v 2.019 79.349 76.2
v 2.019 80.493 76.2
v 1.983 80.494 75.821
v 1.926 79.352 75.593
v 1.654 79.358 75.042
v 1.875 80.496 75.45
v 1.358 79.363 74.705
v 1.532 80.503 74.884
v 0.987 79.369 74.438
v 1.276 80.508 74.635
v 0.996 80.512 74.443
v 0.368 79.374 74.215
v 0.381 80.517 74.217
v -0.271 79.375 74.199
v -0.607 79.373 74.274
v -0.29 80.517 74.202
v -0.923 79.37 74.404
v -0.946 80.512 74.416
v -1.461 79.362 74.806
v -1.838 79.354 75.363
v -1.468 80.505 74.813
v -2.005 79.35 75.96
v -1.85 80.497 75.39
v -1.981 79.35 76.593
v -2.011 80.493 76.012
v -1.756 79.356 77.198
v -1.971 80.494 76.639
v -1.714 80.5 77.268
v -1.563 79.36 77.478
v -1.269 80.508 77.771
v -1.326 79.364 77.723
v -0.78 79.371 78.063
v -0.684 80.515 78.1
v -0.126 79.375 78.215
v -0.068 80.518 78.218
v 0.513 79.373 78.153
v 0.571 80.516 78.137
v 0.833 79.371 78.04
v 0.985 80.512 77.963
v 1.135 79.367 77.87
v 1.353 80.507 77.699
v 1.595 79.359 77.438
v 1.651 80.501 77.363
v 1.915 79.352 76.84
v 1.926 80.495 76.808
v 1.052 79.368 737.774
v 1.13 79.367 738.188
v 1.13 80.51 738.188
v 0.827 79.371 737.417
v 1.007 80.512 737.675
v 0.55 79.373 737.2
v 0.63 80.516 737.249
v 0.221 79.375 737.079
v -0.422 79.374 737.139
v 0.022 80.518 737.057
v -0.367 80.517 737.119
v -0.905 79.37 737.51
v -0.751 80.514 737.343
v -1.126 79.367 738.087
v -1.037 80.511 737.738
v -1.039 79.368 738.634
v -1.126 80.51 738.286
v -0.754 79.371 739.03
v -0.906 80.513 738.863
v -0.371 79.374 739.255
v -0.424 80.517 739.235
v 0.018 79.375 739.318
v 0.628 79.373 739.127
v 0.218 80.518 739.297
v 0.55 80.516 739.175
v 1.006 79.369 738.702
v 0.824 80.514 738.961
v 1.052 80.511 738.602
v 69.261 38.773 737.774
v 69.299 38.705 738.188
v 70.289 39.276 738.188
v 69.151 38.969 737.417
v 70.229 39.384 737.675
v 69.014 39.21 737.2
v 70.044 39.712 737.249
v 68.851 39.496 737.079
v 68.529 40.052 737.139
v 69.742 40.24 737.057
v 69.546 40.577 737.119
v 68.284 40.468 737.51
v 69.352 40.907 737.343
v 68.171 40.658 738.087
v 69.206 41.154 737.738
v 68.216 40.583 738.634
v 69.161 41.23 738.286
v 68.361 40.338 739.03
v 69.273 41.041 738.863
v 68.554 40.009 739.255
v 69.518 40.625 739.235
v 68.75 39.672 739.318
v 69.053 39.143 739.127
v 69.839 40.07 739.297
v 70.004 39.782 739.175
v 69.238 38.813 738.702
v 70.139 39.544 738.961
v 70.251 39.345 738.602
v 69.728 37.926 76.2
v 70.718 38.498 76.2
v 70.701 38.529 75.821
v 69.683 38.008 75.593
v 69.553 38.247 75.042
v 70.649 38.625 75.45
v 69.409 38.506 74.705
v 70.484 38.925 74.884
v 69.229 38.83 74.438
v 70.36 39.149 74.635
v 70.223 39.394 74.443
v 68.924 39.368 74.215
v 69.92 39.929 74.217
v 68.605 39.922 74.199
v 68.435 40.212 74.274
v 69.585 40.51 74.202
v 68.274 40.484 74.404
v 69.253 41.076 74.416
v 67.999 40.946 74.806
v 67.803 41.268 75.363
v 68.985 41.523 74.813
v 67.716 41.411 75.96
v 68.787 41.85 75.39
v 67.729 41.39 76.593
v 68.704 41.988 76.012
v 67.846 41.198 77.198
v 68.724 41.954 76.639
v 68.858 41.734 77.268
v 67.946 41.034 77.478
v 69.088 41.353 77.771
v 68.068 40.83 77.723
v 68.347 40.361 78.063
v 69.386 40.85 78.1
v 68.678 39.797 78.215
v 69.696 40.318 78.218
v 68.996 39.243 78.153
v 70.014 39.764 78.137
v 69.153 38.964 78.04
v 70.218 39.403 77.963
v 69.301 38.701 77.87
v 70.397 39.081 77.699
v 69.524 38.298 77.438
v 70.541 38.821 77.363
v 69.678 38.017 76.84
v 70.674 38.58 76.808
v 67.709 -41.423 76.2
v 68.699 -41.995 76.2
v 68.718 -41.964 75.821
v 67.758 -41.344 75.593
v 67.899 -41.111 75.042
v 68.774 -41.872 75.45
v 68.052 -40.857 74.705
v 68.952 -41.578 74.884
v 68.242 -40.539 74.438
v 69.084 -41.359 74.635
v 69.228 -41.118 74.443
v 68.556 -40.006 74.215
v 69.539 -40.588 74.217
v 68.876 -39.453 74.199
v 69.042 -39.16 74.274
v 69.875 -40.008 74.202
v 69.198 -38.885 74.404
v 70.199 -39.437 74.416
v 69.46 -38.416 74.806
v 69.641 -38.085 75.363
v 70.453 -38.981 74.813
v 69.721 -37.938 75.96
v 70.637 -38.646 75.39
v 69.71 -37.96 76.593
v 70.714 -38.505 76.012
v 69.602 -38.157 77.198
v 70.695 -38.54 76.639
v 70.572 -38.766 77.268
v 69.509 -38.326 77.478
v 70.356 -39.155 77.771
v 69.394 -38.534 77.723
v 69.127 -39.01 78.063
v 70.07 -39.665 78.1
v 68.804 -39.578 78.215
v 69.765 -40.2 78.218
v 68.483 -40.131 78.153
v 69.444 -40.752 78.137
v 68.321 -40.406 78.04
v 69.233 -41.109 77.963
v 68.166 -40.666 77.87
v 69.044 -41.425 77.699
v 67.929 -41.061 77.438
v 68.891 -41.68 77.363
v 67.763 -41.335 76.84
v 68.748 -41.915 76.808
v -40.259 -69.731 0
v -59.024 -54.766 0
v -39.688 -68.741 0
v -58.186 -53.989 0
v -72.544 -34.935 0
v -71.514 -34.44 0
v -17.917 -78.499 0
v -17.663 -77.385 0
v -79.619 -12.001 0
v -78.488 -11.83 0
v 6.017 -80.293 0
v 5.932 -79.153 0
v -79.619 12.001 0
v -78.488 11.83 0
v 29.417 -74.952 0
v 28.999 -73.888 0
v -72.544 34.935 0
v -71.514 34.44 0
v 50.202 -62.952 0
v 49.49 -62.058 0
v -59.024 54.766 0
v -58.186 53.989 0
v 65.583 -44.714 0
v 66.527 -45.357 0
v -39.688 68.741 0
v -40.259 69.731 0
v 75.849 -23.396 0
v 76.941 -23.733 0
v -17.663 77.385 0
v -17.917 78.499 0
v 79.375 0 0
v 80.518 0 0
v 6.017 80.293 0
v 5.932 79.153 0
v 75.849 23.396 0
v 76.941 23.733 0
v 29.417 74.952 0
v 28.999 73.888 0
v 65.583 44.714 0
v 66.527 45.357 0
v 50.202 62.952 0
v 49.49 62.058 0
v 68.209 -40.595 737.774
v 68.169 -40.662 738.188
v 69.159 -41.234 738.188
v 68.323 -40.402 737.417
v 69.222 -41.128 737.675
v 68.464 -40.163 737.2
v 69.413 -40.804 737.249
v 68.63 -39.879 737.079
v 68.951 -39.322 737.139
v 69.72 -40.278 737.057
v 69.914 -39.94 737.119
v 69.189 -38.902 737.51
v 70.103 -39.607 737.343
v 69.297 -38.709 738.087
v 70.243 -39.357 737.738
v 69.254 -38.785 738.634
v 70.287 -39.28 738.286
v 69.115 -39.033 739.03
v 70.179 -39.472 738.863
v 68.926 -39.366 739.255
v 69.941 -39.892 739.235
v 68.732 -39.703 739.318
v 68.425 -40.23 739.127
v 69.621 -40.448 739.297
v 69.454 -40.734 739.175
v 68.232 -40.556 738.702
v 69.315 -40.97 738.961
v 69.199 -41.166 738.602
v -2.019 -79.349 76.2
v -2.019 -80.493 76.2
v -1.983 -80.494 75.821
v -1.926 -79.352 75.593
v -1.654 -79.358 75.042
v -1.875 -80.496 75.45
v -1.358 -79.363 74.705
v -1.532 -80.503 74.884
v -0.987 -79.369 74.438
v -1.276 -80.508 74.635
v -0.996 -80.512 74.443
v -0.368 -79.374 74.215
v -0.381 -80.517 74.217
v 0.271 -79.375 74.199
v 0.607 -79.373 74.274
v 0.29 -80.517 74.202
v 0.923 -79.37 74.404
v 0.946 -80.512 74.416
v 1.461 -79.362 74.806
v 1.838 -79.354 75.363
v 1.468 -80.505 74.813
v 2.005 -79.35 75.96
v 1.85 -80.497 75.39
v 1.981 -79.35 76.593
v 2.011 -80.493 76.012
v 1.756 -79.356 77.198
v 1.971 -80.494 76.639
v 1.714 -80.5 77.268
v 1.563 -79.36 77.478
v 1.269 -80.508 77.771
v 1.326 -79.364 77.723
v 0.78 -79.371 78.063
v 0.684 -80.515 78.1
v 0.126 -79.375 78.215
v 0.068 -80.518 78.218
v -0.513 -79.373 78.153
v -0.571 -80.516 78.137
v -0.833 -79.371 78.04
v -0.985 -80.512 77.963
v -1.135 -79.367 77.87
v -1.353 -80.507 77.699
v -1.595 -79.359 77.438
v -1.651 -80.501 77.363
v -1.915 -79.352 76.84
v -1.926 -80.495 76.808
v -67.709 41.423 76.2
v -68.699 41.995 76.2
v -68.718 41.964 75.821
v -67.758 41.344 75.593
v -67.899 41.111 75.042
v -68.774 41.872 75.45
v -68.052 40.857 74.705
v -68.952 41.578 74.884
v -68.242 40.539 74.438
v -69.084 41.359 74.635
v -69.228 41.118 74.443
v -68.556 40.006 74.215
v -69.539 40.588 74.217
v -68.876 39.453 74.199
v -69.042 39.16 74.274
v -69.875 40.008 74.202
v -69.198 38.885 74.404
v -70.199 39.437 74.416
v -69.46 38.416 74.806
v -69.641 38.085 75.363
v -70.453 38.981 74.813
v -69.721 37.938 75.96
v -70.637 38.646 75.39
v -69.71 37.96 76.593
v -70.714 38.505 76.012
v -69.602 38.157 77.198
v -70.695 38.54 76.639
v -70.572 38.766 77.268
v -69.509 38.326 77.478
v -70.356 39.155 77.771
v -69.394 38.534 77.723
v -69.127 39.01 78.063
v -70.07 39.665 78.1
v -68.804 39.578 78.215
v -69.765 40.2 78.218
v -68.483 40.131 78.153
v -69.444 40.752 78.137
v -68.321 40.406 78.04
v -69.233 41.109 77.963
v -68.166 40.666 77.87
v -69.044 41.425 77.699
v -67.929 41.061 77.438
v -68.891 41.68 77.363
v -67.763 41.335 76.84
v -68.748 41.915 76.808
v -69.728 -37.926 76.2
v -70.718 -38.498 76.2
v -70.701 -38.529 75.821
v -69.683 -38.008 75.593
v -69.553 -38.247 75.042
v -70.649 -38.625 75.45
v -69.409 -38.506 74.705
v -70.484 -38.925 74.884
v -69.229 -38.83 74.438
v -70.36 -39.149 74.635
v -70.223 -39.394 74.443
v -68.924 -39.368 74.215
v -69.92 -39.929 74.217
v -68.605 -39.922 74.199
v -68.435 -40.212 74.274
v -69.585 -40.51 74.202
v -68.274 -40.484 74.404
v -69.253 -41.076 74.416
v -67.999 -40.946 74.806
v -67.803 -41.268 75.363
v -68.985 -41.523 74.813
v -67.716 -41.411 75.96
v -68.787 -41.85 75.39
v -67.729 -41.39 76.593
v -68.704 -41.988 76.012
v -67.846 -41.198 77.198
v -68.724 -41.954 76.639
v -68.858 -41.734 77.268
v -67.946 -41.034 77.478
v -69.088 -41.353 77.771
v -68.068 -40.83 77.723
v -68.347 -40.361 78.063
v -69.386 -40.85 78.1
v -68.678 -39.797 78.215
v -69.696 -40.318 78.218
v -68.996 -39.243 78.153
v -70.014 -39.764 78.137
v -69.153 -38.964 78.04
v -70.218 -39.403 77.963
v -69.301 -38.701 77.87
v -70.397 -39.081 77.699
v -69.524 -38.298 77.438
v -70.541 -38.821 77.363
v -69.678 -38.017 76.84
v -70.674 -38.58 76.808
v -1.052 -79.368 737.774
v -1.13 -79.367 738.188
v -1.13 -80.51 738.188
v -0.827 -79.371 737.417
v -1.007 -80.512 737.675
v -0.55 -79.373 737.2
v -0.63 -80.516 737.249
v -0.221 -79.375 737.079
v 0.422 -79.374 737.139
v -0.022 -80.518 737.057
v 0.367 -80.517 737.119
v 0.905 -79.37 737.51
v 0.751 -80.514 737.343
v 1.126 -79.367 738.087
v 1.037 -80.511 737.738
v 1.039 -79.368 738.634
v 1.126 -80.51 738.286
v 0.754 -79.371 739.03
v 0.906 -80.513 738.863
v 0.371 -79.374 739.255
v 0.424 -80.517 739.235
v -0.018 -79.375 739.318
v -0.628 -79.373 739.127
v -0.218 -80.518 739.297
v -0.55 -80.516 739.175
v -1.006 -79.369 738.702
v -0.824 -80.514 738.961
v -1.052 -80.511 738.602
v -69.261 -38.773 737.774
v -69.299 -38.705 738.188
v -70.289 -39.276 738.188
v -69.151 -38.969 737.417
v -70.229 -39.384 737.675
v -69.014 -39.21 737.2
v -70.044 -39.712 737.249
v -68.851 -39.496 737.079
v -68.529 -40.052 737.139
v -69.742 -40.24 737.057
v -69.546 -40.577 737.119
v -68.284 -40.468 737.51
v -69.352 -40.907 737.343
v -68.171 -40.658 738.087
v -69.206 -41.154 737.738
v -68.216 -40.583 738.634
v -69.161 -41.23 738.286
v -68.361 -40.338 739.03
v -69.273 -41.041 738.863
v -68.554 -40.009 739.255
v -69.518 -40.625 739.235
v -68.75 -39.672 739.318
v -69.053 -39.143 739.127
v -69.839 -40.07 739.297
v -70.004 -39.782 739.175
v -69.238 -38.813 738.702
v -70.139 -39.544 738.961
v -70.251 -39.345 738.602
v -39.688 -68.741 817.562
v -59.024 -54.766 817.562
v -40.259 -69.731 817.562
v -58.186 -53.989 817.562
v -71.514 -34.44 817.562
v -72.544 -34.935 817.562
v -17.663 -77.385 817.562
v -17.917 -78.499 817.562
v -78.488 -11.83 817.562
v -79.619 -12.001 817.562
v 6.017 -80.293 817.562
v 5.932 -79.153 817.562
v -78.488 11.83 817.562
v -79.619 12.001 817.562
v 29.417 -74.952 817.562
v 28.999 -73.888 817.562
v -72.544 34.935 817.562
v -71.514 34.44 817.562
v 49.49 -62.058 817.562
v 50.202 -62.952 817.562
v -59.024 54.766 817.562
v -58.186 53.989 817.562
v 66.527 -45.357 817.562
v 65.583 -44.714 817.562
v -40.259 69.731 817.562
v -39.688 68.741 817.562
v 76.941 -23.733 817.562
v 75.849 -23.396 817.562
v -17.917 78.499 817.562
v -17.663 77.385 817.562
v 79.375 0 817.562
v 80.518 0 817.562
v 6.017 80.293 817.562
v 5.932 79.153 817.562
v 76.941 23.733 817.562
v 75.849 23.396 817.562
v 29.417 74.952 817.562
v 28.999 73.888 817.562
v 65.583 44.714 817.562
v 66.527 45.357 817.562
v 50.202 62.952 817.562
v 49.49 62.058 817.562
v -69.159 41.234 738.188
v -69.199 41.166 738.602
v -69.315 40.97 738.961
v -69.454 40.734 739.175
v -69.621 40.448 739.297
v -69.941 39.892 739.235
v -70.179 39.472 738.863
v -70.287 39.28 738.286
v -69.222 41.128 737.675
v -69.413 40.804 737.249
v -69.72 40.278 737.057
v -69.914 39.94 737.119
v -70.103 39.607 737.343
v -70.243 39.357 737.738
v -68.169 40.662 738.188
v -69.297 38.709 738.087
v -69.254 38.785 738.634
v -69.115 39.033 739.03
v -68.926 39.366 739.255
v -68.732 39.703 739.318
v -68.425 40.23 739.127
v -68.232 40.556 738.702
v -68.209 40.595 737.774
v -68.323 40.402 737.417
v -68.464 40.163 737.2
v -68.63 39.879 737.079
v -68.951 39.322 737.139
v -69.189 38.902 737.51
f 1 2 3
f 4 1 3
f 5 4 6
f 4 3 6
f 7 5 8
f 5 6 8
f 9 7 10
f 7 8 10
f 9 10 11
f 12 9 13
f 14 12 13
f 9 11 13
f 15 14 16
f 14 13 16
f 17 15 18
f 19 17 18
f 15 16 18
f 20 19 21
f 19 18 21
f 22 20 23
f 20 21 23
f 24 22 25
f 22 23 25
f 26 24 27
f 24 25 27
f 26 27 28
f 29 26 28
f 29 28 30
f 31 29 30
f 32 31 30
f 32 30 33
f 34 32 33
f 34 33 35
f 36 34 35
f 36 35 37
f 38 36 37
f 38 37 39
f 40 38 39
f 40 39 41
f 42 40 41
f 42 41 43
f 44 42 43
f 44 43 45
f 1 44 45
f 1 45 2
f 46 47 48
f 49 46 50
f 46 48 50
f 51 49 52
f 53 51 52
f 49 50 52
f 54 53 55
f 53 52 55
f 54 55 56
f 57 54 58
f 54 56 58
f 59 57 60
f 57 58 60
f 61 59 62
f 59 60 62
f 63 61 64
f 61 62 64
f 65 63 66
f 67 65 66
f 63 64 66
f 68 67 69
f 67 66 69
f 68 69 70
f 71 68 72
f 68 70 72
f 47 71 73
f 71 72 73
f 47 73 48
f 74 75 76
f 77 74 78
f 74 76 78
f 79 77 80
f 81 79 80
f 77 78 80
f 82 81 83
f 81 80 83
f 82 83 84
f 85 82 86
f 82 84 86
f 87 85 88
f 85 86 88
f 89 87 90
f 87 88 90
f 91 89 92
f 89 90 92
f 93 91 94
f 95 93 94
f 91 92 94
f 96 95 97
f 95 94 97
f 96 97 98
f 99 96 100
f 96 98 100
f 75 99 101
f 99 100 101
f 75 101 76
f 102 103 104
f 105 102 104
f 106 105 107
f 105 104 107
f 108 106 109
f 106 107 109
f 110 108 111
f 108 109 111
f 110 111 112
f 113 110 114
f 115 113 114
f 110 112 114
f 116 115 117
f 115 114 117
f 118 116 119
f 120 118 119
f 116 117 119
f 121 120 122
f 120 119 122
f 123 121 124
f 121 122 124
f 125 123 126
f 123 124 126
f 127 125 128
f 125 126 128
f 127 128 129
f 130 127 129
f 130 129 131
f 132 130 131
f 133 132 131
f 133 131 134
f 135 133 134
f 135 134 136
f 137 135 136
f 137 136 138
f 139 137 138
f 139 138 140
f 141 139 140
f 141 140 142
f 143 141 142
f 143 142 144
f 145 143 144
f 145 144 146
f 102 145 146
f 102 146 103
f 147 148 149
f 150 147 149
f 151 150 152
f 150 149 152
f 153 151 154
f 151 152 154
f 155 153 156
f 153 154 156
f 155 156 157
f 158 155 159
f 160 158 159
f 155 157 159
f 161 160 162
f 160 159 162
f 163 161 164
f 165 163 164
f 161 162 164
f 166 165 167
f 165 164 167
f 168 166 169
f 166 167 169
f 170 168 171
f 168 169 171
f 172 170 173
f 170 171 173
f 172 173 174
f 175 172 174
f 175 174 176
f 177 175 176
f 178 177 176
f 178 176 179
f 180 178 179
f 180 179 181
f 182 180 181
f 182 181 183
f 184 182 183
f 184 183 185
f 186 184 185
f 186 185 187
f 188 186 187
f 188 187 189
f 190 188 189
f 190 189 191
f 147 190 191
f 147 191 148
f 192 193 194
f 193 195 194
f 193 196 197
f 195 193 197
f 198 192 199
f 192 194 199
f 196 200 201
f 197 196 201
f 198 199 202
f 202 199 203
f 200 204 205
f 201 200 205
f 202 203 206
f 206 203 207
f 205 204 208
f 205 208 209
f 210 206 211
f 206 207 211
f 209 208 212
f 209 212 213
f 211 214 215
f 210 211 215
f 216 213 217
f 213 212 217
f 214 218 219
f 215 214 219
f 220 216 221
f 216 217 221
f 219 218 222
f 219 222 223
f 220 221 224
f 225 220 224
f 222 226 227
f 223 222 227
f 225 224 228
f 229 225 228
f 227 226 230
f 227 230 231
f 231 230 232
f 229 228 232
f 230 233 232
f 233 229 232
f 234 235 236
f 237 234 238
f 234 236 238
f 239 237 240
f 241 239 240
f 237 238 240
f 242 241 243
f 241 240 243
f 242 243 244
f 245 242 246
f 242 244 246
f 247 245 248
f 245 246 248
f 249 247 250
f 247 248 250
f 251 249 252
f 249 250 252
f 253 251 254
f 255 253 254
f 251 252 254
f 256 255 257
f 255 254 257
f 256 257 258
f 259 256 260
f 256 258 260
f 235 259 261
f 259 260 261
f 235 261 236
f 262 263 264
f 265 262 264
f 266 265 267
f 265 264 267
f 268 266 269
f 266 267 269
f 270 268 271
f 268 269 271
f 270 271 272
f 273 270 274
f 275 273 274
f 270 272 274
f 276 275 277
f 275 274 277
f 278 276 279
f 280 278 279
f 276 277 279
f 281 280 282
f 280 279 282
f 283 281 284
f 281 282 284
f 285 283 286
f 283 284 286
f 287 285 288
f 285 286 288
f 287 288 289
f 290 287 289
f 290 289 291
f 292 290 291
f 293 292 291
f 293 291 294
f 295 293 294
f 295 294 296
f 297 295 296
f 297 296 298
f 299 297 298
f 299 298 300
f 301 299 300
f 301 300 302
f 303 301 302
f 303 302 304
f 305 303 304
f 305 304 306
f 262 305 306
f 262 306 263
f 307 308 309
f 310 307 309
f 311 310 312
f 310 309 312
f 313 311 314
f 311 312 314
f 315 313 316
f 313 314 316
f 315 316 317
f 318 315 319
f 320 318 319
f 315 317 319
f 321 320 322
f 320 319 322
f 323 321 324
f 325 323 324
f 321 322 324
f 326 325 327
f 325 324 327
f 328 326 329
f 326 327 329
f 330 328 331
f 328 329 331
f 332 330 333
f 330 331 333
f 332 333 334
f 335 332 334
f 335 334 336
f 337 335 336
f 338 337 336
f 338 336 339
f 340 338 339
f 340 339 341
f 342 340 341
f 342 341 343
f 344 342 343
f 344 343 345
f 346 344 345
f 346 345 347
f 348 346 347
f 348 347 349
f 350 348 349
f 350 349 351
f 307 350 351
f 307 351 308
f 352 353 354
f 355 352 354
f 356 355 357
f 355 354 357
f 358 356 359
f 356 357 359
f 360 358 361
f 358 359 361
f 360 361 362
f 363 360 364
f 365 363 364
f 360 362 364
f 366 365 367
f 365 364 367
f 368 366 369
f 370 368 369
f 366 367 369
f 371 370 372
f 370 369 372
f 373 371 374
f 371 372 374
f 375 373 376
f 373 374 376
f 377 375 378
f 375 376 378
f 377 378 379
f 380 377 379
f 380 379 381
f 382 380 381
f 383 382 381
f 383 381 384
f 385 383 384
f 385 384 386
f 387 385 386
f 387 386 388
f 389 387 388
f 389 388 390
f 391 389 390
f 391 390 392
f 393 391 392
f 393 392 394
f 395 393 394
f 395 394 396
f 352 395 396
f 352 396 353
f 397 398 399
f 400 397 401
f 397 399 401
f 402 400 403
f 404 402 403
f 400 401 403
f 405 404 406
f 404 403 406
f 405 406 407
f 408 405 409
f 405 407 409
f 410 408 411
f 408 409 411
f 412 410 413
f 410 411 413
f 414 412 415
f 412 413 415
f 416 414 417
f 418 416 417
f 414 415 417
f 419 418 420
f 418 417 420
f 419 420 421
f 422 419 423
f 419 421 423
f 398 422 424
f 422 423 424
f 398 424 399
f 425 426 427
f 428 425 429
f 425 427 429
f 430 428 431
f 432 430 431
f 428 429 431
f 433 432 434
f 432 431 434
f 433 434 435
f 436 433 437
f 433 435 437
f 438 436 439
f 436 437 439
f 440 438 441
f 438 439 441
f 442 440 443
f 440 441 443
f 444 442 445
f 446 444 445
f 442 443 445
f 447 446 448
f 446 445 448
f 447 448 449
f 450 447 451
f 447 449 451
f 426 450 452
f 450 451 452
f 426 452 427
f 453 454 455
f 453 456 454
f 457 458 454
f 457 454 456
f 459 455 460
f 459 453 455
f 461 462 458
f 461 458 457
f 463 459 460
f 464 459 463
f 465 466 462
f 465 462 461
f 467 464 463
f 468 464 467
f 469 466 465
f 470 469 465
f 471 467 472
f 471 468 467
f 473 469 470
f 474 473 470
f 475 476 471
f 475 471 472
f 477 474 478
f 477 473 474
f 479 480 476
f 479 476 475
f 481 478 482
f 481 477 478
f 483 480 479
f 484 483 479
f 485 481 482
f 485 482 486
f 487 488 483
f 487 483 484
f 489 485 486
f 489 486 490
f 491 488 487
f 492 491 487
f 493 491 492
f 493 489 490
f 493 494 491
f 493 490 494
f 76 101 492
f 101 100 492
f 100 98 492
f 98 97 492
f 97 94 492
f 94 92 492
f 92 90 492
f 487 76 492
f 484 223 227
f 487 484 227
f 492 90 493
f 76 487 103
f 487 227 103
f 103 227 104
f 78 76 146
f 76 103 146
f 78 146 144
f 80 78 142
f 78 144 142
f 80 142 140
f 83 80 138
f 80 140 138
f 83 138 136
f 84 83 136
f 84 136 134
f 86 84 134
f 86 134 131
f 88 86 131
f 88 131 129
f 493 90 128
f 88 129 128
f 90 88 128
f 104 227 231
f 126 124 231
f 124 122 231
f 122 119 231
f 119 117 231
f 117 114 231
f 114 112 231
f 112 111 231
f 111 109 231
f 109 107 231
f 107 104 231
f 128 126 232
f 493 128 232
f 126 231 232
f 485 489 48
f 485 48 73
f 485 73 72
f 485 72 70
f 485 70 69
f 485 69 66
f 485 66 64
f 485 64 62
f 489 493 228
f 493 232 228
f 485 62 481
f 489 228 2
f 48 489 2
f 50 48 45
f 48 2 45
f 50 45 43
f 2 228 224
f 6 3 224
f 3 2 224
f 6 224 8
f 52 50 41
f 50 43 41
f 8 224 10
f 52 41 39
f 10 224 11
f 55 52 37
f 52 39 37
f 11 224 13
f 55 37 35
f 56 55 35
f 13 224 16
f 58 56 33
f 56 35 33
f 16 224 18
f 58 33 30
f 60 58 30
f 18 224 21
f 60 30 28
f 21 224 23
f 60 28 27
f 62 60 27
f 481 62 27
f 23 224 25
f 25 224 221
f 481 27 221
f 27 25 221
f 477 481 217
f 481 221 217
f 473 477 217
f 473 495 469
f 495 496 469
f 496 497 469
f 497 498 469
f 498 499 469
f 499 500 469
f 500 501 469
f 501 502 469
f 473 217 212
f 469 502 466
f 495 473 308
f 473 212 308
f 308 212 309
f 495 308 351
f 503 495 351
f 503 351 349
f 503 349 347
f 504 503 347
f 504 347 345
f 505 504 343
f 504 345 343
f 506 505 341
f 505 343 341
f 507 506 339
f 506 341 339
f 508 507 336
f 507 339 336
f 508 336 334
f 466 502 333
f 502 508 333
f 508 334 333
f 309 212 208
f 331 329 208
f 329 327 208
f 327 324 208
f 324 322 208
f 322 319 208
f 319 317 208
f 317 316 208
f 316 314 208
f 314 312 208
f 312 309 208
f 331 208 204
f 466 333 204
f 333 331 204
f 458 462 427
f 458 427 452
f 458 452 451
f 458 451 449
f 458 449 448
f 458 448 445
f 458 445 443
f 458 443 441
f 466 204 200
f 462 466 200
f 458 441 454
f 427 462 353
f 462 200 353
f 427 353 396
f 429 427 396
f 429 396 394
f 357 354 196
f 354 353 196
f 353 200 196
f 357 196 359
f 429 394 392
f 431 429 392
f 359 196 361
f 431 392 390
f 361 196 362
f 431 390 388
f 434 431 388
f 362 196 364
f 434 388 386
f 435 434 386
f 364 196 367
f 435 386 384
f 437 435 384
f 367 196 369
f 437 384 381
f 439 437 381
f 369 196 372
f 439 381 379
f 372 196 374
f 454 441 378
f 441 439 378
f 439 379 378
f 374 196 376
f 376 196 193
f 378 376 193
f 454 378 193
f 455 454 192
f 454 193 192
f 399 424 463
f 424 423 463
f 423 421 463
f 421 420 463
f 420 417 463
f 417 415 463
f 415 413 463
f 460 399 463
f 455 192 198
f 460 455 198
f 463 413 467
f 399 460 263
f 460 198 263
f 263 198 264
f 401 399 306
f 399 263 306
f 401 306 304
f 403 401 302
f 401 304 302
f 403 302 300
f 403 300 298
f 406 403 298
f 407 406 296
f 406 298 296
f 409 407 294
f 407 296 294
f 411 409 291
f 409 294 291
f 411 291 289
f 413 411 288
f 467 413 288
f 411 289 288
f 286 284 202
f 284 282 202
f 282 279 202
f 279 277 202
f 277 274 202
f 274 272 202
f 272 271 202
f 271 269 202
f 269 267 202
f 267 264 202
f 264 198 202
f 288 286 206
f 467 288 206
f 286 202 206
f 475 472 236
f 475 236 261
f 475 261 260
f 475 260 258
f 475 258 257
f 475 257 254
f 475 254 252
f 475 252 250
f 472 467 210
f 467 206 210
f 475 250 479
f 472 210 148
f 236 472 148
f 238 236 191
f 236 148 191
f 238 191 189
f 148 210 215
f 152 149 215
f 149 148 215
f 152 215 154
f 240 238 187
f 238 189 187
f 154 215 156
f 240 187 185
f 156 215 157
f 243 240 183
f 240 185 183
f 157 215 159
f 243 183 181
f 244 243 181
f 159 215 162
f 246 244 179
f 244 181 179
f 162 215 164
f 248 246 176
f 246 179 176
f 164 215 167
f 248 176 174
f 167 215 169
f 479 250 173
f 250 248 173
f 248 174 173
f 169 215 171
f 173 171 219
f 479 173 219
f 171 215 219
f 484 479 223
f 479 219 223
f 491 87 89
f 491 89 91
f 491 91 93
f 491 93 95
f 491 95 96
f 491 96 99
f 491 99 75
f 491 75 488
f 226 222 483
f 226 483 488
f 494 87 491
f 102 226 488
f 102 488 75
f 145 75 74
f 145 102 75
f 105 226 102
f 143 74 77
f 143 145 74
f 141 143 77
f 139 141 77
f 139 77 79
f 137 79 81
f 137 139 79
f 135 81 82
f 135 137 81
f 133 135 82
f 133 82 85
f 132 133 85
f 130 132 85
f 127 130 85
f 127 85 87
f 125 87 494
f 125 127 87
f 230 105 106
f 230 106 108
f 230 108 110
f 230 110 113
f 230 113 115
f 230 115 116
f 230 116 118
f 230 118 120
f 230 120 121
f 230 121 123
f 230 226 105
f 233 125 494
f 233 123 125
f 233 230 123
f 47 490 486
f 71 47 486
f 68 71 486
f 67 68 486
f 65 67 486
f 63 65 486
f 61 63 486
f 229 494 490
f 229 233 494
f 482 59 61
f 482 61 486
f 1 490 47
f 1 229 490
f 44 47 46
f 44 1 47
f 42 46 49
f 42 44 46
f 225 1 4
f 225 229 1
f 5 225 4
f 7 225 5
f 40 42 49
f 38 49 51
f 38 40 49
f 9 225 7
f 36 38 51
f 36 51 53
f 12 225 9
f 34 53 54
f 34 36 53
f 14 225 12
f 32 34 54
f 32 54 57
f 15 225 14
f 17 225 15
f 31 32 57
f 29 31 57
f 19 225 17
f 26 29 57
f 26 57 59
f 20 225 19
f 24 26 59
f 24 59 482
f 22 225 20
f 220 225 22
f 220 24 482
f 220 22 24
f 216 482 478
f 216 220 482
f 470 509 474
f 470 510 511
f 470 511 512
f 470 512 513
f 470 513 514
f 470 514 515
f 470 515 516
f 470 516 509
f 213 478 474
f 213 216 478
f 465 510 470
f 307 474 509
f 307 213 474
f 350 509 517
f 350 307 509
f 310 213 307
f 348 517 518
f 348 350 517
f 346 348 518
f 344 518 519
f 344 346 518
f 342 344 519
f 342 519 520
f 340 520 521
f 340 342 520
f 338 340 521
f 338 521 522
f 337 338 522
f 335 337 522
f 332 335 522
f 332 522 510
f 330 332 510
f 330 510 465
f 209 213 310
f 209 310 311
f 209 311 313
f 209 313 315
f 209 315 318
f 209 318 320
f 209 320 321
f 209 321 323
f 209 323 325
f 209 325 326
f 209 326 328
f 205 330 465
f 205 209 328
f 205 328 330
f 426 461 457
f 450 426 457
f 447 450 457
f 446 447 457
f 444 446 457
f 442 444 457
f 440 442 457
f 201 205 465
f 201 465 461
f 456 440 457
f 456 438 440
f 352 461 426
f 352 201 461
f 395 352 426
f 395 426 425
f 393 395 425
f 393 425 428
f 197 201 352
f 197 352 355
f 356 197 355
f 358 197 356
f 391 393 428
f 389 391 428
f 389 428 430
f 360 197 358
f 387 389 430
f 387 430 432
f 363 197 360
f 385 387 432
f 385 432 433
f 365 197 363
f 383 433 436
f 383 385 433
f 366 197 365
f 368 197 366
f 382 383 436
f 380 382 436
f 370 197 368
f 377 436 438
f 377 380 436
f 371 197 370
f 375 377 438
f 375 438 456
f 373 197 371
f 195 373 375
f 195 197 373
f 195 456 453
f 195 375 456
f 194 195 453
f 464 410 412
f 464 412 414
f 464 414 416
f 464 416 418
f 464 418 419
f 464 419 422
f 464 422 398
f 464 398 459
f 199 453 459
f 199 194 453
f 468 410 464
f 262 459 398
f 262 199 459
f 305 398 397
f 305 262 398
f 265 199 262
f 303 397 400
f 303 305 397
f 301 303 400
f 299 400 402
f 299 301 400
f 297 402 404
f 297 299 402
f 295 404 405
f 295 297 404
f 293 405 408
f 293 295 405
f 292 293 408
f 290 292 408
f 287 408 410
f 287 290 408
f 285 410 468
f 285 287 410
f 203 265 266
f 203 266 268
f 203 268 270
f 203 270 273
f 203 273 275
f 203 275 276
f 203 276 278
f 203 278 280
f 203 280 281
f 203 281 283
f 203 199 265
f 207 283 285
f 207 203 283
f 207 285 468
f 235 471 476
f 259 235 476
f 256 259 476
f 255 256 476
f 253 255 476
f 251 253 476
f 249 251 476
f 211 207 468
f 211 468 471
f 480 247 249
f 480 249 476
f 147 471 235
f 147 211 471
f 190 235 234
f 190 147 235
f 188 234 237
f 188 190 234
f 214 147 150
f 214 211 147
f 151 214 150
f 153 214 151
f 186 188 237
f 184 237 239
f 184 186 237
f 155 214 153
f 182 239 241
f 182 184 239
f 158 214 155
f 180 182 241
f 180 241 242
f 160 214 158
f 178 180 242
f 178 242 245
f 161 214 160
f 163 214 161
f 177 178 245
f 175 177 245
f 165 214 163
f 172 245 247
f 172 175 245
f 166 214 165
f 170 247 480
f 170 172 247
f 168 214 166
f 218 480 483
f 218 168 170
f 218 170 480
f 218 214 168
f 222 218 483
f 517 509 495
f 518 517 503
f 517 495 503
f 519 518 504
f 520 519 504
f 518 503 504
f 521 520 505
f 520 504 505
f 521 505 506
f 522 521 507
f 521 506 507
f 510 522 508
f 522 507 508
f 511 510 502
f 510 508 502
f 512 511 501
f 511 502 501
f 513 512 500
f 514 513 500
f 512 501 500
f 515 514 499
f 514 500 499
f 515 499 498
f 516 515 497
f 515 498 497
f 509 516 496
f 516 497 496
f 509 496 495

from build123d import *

# Parameters (mm, degrees)
SKETCH1_R                       = 80.518
SKETCH1_R_2                     = 79.375
BOSS_EXTRUDE1_DEPTH             = 817.5625
TAP_DRILL_FOR_10_32_TAP1_REACH  = 839.152
TAP_DRILL_FOR_10_32_TAP1_BORE_R = 2.0193
TAP_DRILL_FOR_4_40_TAP1_REACH   = 839.152
TAP_DRILL_FOR_4_40_TAP1_BORE_R  = 1.1303
CIRPATTERN1_COUNT               = 6


with BuildPart() as part:
    # Sketch1 → Boss-Extrude1 (new body)
    with BuildSketch(Plane.XY):
        Circle(SKETCH1_R)
        Circle(SKETCH1_R_2, mode=Mode.SUBTRACT)
    extrude(amount=BOSS_EXTRUDE1_DEPTH)

    # Tap Drill for #10-32 Tap1 bore → Tap Drill for #10-32 Tap1 (cut, up to next)
    with BuildSketch(Plane(origin=(0, 80.518, 0), x_dir=(1, 0, 0), z_dir=(0, 1, 0)), mode=Mode.PRIVATE) as tap_drill_for_10_32_tap1_sk1:
        with Locations((0, -76.2)):
            Circle(TAP_DRILL_FOR_10_32_TAP1_BORE_R)
    tap_drill_for_10_32_tap1_tool1 = extrude(tap_drill_for_10_32_tap1_sk1.sketch, amount=-TAP_DRILL_FOR_10_32_TAP1_REACH, mode=Mode.PRIVATE) & part.part
    tap_drill_for_10_32_tap1 = tap_drill_for_10_32_tap1_tool1.solids().sort_by_distance((0, 80.518, 76.2))[0]
    add(tap_drill_for_10_32_tap1, mode=Mode.SUBTRACT)

    # Tap Drill for #4-40 Tap1 bore → Tap Drill for #4-40 Tap1 (cut, up to next)
    with BuildSketch(Plane(origin=(0, 80.518, 0), x_dir=(1, 0, 0), z_dir=(0, 1, 0)), mode=Mode.PRIVATE) as tap_drill_for_4_40_tap1_sk1:
        with Locations((0, -738.1875)):
            Circle(TAP_DRILL_FOR_4_40_TAP1_BORE_R)
    tap_drill_for_4_40_tap1_tool1 = extrude(tap_drill_for_4_40_tap1_sk1.sketch, amount=-TAP_DRILL_FOR_4_40_TAP1_REACH, mode=Mode.PRIVATE) & part.part
    tap_drill_for_4_40_tap1 = tap_drill_for_4_40_tap1_tool1.solids().sort_by_distance((0, 80.518, 738.1875))[0]
    add(tap_drill_for_4_40_tap1, mode=Mode.SUBTRACT)

    # CirPattern1: Tap Drill for #10-32 Tap1, Tap Drill for #4-40 Tap1 ×6 about axis
    cirpattern1_axis = Axis((0, 0, 817.5625), (0, 0, 1))
    add([tap_drill_for_10_32_tap1.rotate(cirpattern1_axis, i * 360 / CIRPATTERN1_COUNT) for i in range(1, CIRPATTERN1_COUNT)], mode=Mode.SUBTRACT)
    add([tap_drill_for_4_40_tap1.rotate(cirpattern1_axis, i * 360 / CIRPATTERN1_COUNT) for i in range(1, CIRPATTERN1_COUNT)], mode=Mode.SUBTRACT)


solid = part.part
